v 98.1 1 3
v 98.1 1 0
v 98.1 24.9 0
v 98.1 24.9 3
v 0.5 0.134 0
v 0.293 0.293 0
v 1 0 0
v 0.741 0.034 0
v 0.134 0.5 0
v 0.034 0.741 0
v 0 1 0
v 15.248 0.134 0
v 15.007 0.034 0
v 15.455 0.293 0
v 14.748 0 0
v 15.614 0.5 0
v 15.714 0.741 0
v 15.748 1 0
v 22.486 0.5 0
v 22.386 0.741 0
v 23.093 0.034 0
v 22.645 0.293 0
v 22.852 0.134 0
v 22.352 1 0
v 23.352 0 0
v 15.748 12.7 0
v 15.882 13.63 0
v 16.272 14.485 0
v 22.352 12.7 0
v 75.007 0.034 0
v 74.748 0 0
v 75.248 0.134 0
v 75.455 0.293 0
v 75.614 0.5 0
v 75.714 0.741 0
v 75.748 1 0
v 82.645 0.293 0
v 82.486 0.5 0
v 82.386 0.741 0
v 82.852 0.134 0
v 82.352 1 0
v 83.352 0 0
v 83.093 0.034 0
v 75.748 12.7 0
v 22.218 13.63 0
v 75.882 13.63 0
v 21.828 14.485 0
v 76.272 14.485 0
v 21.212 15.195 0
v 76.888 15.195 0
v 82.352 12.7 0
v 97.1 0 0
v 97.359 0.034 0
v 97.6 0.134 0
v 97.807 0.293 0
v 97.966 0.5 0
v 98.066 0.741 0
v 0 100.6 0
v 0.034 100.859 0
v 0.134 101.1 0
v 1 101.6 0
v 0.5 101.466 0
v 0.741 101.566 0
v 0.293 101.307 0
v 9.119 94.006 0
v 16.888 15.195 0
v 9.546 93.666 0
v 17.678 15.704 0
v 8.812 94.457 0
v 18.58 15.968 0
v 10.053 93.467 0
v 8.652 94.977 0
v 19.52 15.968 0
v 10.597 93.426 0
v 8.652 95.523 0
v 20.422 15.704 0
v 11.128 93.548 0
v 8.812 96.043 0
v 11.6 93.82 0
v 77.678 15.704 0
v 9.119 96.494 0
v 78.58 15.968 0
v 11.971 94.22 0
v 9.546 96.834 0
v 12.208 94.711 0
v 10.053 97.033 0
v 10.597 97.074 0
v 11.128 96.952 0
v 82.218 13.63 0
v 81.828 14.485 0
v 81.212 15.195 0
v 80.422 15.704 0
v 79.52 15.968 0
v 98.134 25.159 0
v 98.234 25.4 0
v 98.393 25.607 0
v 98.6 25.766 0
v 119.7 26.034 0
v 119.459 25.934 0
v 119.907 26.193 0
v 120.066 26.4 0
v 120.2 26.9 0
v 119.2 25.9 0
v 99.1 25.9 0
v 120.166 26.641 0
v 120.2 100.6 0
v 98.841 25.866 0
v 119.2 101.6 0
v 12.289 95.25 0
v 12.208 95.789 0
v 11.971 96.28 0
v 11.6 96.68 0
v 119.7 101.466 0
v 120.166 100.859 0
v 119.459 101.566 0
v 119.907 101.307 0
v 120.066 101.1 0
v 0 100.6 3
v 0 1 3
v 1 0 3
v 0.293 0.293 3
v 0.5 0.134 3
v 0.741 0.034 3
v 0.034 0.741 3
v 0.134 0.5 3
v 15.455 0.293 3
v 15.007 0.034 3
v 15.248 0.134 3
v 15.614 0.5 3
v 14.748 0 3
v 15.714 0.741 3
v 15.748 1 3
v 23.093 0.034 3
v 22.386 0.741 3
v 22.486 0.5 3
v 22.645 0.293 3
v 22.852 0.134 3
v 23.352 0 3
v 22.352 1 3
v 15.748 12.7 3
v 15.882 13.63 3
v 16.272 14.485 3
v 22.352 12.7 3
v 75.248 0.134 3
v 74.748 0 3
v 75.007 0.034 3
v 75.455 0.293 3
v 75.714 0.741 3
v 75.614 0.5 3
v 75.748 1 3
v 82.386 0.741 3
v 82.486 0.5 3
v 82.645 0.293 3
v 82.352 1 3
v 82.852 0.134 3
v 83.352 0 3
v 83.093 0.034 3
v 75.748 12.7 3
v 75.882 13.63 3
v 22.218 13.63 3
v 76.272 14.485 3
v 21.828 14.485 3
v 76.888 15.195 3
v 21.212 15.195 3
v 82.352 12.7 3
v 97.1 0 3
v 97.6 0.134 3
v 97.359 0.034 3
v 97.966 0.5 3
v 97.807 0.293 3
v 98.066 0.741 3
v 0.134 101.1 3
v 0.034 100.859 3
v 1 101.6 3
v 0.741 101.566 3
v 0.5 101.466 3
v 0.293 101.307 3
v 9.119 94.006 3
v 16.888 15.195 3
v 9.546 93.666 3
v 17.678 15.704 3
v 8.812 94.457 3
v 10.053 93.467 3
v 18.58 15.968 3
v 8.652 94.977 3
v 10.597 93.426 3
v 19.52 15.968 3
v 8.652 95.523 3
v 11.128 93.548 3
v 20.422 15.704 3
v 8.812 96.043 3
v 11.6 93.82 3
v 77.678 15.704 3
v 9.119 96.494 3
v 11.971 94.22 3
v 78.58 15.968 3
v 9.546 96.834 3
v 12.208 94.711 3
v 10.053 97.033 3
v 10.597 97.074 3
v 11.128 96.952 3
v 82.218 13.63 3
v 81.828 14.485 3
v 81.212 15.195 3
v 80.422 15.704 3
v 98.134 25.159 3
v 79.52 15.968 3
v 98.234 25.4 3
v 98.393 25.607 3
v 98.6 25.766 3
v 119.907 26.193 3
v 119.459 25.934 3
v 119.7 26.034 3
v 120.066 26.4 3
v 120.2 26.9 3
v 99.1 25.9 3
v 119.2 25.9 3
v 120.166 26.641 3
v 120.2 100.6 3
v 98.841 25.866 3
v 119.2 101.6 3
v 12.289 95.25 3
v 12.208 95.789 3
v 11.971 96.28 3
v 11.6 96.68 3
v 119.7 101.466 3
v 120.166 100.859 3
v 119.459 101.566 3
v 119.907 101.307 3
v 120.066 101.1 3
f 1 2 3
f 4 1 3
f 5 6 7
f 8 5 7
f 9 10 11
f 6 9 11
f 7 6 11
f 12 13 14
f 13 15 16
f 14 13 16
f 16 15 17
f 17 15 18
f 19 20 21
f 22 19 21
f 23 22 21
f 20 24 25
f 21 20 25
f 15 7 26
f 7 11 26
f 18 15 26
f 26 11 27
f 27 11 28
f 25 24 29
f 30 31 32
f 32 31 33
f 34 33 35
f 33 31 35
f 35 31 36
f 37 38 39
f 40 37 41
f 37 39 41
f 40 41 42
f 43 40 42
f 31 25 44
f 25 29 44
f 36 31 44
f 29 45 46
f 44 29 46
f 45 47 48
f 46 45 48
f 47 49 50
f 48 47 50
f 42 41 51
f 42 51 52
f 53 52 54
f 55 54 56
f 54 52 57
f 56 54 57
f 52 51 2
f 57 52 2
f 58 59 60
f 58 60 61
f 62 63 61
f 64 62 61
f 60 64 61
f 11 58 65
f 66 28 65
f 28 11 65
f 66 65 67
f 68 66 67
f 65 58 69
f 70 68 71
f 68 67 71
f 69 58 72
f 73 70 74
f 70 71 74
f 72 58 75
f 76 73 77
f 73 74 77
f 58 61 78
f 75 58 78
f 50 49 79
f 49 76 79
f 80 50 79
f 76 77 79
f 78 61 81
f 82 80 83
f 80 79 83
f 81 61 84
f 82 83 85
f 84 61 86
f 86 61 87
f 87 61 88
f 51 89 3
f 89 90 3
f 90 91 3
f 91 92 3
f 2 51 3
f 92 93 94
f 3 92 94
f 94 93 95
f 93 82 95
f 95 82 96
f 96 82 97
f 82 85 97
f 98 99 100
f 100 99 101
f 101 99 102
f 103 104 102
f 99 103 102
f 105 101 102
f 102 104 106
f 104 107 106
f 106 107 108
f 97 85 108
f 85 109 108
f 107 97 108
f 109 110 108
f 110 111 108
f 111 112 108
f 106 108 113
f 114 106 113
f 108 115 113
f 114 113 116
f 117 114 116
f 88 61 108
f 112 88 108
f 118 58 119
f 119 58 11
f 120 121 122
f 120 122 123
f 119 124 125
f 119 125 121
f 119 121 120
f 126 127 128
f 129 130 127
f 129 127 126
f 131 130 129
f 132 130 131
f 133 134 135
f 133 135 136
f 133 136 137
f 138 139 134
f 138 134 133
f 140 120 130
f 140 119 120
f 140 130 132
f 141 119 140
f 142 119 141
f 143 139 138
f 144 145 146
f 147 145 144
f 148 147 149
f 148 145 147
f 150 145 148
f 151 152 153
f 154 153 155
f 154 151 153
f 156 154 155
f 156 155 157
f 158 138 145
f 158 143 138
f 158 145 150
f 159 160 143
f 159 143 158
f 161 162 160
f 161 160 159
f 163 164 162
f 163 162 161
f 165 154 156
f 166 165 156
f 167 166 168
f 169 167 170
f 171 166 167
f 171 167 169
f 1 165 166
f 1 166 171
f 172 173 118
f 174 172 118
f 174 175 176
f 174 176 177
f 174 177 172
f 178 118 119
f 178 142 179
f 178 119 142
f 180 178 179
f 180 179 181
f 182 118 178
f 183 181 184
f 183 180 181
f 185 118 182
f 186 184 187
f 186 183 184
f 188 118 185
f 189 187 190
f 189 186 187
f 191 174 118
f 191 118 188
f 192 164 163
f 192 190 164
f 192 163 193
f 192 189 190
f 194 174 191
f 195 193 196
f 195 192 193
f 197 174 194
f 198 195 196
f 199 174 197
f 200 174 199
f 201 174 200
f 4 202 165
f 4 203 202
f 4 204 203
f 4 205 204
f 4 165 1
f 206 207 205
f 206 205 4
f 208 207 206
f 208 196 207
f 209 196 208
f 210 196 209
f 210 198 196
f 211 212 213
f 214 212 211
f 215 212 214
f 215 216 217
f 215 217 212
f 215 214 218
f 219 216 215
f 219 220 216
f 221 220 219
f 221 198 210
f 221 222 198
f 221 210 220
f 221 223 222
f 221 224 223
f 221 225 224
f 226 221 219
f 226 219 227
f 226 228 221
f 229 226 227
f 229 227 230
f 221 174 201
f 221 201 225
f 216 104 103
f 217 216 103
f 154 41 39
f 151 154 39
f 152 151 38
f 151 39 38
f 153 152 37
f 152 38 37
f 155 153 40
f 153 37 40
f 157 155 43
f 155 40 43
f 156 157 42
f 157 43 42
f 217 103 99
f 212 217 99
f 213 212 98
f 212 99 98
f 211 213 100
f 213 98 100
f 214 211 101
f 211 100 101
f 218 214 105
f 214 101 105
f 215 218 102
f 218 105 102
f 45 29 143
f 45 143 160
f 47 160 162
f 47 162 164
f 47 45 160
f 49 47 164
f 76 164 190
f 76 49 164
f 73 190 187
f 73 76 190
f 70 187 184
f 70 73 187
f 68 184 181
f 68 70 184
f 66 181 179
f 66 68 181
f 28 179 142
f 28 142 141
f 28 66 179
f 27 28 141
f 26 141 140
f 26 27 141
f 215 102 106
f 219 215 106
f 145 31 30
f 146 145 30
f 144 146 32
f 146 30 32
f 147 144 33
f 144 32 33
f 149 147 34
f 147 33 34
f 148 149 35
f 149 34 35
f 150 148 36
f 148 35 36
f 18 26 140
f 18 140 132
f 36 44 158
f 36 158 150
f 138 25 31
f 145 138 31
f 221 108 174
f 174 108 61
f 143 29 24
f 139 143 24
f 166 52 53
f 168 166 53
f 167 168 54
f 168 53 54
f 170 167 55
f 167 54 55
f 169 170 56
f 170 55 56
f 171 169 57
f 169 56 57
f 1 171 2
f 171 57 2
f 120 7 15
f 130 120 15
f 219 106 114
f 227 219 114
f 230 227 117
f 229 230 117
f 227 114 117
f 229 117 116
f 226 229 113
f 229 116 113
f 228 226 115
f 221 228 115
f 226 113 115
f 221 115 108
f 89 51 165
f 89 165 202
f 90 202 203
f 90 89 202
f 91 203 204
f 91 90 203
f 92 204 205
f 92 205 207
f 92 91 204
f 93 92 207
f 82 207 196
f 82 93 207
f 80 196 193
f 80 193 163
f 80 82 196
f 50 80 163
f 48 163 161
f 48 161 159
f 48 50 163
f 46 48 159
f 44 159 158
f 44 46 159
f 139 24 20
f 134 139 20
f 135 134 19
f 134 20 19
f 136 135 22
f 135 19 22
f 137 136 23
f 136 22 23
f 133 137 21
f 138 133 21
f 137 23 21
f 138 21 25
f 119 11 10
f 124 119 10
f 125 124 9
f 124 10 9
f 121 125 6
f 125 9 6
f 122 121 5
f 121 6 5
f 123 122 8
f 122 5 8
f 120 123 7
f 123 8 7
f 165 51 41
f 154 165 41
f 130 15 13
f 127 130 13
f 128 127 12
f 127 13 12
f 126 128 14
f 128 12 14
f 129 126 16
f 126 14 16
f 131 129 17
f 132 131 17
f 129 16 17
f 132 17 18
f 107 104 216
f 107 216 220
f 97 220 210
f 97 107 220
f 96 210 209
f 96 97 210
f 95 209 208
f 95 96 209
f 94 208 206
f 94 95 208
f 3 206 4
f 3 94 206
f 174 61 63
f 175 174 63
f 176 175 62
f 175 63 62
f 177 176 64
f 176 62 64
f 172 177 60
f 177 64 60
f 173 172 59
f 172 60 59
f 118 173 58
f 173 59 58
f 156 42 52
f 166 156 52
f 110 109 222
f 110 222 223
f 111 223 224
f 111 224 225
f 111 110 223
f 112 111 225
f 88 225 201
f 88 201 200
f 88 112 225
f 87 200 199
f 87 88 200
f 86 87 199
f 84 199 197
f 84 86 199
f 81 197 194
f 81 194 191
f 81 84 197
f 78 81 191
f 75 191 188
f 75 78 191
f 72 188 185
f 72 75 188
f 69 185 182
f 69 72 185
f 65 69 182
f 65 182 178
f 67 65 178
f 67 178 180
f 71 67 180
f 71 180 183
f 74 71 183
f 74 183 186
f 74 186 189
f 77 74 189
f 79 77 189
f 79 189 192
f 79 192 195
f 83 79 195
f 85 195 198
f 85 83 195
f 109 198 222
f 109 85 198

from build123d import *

# Parameters (mm, degrees)
SKETCH_R  = 1.8288
PAD_DEPTH = 3


with BuildPart() as part:
    # Sketch → Pad (new body)
    with BuildSketch(Plane.XY):
        with BuildLine():
            Line((0, 100.6), (0, 1))
            ThreePointArc((0, 1), (0.292893, 0.292893), (1, 0))
            Line((1, 0), (14.748, 0))
            ThreePointArc((14.748, 0), (15.455107, 0.292893), (15.748, 1))
            Line((15.748, 12.7), (15.748, 1))
            ThreePointArc((22.352, 12.7), (19.05, 16.002), (15.748, 12.7))
            Line((22.352, 12.7), (22.352, 1))
            ThreePointArc((22.352, 1), (22.644893, 0.292893), (23.352, 0))
            Line((23.352, 0), (74.748, 0))
            ThreePointArc((74.748, 0), (75.455107, 0.292893), (75.748, 1))
            Line((75.748, 12.7), (75.748, 1))
            ThreePointArc((82.352, 12.7), (79.05, 16.002), (75.748, 12.7))
            Line((82.352, 12.7), (82.352, 1))
            ThreePointArc((82.352, 1), (82.644893, 0.292893), (83.352, 0))
            Line((83.352, 0), (97.1, 0))
            ThreePointArc((97.1, 0), (97.807107, 0.292893), (98.1, 1))
            Line((98.1, 1), (98.1, 24.9))
            ThreePointArc((99.1, 25.9), (98.392893, 25.607107), (98.1, 24.9))
            Line((99.1, 25.9), (119.2001, 25.9))
            ThreePointArc((119.2001, 25.9), (119.907207, 26.192893), (120.2001, 26.9))
            Line((120.2001, 26.9), (120.2001, 100.6))
            ThreePointArc((120.2001, 100.6), (119.907207, 101.307107), (119.2001, 101.6))
            Line((119.2001, 101.6), (1, 101.6))
            ThreePointArc((1, 101.6), (0.292893, 101.307107), (0, 100.6))
        make_face()
        with Locations((10.46, 95.25)):
            Circle(SKETCH_R, mode=Mode.SUBTRACT)
    extrude(amount=PAD_DEPTH)


solid = part.part
